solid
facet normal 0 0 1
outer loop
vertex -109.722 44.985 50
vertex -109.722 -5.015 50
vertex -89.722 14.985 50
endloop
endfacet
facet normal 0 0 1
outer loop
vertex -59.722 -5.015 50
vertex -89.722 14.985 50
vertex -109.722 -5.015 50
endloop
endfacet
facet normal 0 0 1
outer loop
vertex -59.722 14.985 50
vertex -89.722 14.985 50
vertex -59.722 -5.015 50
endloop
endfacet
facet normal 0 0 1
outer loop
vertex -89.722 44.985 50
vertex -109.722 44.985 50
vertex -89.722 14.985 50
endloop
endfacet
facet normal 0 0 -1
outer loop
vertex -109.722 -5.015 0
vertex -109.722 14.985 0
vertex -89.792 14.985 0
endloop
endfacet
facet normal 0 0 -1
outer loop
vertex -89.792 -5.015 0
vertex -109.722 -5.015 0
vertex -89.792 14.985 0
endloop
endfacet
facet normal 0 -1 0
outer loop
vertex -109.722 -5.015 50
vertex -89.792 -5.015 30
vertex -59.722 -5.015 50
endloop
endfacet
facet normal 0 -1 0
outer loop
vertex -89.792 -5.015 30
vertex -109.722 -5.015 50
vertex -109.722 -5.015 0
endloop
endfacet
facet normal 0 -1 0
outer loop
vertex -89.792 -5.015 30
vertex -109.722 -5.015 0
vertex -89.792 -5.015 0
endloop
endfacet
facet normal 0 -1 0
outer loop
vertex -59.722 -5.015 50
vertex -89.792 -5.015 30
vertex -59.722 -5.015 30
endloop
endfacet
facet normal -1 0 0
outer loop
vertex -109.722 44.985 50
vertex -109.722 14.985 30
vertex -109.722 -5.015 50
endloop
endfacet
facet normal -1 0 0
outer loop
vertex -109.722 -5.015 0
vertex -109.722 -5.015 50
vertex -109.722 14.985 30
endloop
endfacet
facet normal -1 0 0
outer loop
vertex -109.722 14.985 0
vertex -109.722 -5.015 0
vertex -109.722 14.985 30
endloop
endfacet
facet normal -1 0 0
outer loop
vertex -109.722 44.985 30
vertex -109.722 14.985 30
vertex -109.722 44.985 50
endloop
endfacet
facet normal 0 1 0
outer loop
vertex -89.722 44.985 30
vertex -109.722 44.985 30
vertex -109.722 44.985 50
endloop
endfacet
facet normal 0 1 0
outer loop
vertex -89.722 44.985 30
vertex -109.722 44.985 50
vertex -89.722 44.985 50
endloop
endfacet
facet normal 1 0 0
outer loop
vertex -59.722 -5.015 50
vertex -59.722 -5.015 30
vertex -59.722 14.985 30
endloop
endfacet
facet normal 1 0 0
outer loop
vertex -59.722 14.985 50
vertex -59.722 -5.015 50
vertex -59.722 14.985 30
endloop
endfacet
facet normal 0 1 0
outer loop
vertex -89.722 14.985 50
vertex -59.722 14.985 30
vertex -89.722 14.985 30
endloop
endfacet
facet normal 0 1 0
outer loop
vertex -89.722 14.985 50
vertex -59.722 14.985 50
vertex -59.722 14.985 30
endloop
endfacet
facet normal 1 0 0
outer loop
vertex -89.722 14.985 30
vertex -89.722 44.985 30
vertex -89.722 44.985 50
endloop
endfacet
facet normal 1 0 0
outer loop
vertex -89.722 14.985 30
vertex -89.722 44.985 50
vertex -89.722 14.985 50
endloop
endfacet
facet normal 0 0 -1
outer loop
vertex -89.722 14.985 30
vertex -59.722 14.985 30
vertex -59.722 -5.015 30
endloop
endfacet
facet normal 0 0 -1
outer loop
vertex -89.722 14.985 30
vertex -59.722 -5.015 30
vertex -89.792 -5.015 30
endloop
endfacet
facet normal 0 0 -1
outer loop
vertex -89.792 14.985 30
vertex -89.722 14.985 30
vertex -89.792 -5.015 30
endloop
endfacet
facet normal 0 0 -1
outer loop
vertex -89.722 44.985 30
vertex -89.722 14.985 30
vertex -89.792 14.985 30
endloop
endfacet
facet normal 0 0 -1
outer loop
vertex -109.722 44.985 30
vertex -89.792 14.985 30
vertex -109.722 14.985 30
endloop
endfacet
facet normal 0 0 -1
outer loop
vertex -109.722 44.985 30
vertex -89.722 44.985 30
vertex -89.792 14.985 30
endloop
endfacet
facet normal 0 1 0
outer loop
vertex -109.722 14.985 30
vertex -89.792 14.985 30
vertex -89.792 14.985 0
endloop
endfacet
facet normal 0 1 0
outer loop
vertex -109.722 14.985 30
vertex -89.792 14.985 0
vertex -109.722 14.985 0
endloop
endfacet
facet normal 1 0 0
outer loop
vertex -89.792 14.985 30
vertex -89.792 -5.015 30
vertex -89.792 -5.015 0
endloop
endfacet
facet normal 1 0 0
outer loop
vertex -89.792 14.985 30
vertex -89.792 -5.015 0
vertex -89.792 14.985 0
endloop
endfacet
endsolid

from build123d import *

# Parameters (mm, degrees)
ESQUISSE2_W                  = 50
ESQUISSE2_H                  = 50
BOSS_EXTRU_1_DEPTH           = 50
ENL_V_MAT_EXTRU_1_DEPTH      = 129.695677467
ENL_V_MAT_EXTRU_1_DEPTH_BACK = 50
ENL_V_MAT_EXTRU_2_DEPTH      = 129.695677467
ENL_V_MAT_EXTRU_2_DEPTH_BACK = 30
ENL_V_MAT_EXTRU_3_DEPTH      = 129.695677467
ENL_V_MAT_EXTRU_3_DEPTH_BACK = 30


with BuildPart() as part:
    # Esquisse2 → Boss.-Extru.1 (new body)
    with BuildSketch(Plane.XY):
        with Locations((-84.722222222, 19.984567901)):
            Rectangle(ESQUISSE2_W, ESQUISSE2_H)
    extrude(amount=BOSS_EXTRU_1_DEPTH)

    # Esquisse3 → Enlèv. mat.-Extru.1 (cut, two sides: drawn at the far end of the back side and taken through both)
    with BuildSketch(Plane.XY.offset(50).offset(-ENL_V_MAT_EXTRU_1_DEPTH_BACK)):
        Polygon((-89.722222222, 171.603605798), (-89.722222222, 44.984567901), (-89.722222222, 14.984567901), (-59.722222222, 14.984567901), (66.896815675, 14.984567901), (245.963176323, 194.05092855), (89.344138426, 350.669966447), align=None)
    extrude(amount=ENL_V_MAT_EXTRU_1_DEPTH + ENL_V_MAT_EXTRU_1_DEPTH_BACK, mode=Mode.SUBTRACT)

    # Esquisse4 → Enlèv. mat.-Extru.2 (cut, two sides: drawn at the far end of the back side and taken through both)
    with BuildSketch(Plane(origin=(0, 0, 0), x_dir=(-1, 0, 0), z_dir=(0, 0, -1)).offset(-ENL_V_MAT_EXTRU_2_DEPTH_BACK)):
        Polygon((-36.896815675, 14.984567901), (89.722222222, 14.984567901), (109.722222222, 14.984567901), (236.341260119, 14.984567901), (236.341260119, 268.222643695), (-36.896815675, 268.222643695), align=None)
    extrude(amount=ENL_V_MAT_EXTRU_2_DEPTH + ENL_V_MAT_EXTRU_2_DEPTH_BACK, mode=Mode.SUBTRACT)

    # Esquisse5 → Enlèv. mat.-Extru.3 (cut, two sides: drawn at the far end of the back side and taken through both)
    with BuildSketch(Plane(origin=(0, 0, 0), x_dir=(-1, 0, 0), z_dir=(0, 0, -1)).offset(-ENL_V_MAT_EXTRU_3_DEPTH_BACK)):
        Polygon((89.792498294, 141.675981519), (89.792498294, 14.984567901), (89.792498294, -5.015432099), (89.792498294, -131.706845716), (-163.590328941, -131.706845716), (-163.590328941, 141.675981519), align=None)
    extrude(amount=ENL_V_MAT_EXTRU_3_DEPTH + ENL_V_MAT_EXTRU_3_DEPTH_BACK, mode=Mode.SUBTRACT)


solid = part.part
